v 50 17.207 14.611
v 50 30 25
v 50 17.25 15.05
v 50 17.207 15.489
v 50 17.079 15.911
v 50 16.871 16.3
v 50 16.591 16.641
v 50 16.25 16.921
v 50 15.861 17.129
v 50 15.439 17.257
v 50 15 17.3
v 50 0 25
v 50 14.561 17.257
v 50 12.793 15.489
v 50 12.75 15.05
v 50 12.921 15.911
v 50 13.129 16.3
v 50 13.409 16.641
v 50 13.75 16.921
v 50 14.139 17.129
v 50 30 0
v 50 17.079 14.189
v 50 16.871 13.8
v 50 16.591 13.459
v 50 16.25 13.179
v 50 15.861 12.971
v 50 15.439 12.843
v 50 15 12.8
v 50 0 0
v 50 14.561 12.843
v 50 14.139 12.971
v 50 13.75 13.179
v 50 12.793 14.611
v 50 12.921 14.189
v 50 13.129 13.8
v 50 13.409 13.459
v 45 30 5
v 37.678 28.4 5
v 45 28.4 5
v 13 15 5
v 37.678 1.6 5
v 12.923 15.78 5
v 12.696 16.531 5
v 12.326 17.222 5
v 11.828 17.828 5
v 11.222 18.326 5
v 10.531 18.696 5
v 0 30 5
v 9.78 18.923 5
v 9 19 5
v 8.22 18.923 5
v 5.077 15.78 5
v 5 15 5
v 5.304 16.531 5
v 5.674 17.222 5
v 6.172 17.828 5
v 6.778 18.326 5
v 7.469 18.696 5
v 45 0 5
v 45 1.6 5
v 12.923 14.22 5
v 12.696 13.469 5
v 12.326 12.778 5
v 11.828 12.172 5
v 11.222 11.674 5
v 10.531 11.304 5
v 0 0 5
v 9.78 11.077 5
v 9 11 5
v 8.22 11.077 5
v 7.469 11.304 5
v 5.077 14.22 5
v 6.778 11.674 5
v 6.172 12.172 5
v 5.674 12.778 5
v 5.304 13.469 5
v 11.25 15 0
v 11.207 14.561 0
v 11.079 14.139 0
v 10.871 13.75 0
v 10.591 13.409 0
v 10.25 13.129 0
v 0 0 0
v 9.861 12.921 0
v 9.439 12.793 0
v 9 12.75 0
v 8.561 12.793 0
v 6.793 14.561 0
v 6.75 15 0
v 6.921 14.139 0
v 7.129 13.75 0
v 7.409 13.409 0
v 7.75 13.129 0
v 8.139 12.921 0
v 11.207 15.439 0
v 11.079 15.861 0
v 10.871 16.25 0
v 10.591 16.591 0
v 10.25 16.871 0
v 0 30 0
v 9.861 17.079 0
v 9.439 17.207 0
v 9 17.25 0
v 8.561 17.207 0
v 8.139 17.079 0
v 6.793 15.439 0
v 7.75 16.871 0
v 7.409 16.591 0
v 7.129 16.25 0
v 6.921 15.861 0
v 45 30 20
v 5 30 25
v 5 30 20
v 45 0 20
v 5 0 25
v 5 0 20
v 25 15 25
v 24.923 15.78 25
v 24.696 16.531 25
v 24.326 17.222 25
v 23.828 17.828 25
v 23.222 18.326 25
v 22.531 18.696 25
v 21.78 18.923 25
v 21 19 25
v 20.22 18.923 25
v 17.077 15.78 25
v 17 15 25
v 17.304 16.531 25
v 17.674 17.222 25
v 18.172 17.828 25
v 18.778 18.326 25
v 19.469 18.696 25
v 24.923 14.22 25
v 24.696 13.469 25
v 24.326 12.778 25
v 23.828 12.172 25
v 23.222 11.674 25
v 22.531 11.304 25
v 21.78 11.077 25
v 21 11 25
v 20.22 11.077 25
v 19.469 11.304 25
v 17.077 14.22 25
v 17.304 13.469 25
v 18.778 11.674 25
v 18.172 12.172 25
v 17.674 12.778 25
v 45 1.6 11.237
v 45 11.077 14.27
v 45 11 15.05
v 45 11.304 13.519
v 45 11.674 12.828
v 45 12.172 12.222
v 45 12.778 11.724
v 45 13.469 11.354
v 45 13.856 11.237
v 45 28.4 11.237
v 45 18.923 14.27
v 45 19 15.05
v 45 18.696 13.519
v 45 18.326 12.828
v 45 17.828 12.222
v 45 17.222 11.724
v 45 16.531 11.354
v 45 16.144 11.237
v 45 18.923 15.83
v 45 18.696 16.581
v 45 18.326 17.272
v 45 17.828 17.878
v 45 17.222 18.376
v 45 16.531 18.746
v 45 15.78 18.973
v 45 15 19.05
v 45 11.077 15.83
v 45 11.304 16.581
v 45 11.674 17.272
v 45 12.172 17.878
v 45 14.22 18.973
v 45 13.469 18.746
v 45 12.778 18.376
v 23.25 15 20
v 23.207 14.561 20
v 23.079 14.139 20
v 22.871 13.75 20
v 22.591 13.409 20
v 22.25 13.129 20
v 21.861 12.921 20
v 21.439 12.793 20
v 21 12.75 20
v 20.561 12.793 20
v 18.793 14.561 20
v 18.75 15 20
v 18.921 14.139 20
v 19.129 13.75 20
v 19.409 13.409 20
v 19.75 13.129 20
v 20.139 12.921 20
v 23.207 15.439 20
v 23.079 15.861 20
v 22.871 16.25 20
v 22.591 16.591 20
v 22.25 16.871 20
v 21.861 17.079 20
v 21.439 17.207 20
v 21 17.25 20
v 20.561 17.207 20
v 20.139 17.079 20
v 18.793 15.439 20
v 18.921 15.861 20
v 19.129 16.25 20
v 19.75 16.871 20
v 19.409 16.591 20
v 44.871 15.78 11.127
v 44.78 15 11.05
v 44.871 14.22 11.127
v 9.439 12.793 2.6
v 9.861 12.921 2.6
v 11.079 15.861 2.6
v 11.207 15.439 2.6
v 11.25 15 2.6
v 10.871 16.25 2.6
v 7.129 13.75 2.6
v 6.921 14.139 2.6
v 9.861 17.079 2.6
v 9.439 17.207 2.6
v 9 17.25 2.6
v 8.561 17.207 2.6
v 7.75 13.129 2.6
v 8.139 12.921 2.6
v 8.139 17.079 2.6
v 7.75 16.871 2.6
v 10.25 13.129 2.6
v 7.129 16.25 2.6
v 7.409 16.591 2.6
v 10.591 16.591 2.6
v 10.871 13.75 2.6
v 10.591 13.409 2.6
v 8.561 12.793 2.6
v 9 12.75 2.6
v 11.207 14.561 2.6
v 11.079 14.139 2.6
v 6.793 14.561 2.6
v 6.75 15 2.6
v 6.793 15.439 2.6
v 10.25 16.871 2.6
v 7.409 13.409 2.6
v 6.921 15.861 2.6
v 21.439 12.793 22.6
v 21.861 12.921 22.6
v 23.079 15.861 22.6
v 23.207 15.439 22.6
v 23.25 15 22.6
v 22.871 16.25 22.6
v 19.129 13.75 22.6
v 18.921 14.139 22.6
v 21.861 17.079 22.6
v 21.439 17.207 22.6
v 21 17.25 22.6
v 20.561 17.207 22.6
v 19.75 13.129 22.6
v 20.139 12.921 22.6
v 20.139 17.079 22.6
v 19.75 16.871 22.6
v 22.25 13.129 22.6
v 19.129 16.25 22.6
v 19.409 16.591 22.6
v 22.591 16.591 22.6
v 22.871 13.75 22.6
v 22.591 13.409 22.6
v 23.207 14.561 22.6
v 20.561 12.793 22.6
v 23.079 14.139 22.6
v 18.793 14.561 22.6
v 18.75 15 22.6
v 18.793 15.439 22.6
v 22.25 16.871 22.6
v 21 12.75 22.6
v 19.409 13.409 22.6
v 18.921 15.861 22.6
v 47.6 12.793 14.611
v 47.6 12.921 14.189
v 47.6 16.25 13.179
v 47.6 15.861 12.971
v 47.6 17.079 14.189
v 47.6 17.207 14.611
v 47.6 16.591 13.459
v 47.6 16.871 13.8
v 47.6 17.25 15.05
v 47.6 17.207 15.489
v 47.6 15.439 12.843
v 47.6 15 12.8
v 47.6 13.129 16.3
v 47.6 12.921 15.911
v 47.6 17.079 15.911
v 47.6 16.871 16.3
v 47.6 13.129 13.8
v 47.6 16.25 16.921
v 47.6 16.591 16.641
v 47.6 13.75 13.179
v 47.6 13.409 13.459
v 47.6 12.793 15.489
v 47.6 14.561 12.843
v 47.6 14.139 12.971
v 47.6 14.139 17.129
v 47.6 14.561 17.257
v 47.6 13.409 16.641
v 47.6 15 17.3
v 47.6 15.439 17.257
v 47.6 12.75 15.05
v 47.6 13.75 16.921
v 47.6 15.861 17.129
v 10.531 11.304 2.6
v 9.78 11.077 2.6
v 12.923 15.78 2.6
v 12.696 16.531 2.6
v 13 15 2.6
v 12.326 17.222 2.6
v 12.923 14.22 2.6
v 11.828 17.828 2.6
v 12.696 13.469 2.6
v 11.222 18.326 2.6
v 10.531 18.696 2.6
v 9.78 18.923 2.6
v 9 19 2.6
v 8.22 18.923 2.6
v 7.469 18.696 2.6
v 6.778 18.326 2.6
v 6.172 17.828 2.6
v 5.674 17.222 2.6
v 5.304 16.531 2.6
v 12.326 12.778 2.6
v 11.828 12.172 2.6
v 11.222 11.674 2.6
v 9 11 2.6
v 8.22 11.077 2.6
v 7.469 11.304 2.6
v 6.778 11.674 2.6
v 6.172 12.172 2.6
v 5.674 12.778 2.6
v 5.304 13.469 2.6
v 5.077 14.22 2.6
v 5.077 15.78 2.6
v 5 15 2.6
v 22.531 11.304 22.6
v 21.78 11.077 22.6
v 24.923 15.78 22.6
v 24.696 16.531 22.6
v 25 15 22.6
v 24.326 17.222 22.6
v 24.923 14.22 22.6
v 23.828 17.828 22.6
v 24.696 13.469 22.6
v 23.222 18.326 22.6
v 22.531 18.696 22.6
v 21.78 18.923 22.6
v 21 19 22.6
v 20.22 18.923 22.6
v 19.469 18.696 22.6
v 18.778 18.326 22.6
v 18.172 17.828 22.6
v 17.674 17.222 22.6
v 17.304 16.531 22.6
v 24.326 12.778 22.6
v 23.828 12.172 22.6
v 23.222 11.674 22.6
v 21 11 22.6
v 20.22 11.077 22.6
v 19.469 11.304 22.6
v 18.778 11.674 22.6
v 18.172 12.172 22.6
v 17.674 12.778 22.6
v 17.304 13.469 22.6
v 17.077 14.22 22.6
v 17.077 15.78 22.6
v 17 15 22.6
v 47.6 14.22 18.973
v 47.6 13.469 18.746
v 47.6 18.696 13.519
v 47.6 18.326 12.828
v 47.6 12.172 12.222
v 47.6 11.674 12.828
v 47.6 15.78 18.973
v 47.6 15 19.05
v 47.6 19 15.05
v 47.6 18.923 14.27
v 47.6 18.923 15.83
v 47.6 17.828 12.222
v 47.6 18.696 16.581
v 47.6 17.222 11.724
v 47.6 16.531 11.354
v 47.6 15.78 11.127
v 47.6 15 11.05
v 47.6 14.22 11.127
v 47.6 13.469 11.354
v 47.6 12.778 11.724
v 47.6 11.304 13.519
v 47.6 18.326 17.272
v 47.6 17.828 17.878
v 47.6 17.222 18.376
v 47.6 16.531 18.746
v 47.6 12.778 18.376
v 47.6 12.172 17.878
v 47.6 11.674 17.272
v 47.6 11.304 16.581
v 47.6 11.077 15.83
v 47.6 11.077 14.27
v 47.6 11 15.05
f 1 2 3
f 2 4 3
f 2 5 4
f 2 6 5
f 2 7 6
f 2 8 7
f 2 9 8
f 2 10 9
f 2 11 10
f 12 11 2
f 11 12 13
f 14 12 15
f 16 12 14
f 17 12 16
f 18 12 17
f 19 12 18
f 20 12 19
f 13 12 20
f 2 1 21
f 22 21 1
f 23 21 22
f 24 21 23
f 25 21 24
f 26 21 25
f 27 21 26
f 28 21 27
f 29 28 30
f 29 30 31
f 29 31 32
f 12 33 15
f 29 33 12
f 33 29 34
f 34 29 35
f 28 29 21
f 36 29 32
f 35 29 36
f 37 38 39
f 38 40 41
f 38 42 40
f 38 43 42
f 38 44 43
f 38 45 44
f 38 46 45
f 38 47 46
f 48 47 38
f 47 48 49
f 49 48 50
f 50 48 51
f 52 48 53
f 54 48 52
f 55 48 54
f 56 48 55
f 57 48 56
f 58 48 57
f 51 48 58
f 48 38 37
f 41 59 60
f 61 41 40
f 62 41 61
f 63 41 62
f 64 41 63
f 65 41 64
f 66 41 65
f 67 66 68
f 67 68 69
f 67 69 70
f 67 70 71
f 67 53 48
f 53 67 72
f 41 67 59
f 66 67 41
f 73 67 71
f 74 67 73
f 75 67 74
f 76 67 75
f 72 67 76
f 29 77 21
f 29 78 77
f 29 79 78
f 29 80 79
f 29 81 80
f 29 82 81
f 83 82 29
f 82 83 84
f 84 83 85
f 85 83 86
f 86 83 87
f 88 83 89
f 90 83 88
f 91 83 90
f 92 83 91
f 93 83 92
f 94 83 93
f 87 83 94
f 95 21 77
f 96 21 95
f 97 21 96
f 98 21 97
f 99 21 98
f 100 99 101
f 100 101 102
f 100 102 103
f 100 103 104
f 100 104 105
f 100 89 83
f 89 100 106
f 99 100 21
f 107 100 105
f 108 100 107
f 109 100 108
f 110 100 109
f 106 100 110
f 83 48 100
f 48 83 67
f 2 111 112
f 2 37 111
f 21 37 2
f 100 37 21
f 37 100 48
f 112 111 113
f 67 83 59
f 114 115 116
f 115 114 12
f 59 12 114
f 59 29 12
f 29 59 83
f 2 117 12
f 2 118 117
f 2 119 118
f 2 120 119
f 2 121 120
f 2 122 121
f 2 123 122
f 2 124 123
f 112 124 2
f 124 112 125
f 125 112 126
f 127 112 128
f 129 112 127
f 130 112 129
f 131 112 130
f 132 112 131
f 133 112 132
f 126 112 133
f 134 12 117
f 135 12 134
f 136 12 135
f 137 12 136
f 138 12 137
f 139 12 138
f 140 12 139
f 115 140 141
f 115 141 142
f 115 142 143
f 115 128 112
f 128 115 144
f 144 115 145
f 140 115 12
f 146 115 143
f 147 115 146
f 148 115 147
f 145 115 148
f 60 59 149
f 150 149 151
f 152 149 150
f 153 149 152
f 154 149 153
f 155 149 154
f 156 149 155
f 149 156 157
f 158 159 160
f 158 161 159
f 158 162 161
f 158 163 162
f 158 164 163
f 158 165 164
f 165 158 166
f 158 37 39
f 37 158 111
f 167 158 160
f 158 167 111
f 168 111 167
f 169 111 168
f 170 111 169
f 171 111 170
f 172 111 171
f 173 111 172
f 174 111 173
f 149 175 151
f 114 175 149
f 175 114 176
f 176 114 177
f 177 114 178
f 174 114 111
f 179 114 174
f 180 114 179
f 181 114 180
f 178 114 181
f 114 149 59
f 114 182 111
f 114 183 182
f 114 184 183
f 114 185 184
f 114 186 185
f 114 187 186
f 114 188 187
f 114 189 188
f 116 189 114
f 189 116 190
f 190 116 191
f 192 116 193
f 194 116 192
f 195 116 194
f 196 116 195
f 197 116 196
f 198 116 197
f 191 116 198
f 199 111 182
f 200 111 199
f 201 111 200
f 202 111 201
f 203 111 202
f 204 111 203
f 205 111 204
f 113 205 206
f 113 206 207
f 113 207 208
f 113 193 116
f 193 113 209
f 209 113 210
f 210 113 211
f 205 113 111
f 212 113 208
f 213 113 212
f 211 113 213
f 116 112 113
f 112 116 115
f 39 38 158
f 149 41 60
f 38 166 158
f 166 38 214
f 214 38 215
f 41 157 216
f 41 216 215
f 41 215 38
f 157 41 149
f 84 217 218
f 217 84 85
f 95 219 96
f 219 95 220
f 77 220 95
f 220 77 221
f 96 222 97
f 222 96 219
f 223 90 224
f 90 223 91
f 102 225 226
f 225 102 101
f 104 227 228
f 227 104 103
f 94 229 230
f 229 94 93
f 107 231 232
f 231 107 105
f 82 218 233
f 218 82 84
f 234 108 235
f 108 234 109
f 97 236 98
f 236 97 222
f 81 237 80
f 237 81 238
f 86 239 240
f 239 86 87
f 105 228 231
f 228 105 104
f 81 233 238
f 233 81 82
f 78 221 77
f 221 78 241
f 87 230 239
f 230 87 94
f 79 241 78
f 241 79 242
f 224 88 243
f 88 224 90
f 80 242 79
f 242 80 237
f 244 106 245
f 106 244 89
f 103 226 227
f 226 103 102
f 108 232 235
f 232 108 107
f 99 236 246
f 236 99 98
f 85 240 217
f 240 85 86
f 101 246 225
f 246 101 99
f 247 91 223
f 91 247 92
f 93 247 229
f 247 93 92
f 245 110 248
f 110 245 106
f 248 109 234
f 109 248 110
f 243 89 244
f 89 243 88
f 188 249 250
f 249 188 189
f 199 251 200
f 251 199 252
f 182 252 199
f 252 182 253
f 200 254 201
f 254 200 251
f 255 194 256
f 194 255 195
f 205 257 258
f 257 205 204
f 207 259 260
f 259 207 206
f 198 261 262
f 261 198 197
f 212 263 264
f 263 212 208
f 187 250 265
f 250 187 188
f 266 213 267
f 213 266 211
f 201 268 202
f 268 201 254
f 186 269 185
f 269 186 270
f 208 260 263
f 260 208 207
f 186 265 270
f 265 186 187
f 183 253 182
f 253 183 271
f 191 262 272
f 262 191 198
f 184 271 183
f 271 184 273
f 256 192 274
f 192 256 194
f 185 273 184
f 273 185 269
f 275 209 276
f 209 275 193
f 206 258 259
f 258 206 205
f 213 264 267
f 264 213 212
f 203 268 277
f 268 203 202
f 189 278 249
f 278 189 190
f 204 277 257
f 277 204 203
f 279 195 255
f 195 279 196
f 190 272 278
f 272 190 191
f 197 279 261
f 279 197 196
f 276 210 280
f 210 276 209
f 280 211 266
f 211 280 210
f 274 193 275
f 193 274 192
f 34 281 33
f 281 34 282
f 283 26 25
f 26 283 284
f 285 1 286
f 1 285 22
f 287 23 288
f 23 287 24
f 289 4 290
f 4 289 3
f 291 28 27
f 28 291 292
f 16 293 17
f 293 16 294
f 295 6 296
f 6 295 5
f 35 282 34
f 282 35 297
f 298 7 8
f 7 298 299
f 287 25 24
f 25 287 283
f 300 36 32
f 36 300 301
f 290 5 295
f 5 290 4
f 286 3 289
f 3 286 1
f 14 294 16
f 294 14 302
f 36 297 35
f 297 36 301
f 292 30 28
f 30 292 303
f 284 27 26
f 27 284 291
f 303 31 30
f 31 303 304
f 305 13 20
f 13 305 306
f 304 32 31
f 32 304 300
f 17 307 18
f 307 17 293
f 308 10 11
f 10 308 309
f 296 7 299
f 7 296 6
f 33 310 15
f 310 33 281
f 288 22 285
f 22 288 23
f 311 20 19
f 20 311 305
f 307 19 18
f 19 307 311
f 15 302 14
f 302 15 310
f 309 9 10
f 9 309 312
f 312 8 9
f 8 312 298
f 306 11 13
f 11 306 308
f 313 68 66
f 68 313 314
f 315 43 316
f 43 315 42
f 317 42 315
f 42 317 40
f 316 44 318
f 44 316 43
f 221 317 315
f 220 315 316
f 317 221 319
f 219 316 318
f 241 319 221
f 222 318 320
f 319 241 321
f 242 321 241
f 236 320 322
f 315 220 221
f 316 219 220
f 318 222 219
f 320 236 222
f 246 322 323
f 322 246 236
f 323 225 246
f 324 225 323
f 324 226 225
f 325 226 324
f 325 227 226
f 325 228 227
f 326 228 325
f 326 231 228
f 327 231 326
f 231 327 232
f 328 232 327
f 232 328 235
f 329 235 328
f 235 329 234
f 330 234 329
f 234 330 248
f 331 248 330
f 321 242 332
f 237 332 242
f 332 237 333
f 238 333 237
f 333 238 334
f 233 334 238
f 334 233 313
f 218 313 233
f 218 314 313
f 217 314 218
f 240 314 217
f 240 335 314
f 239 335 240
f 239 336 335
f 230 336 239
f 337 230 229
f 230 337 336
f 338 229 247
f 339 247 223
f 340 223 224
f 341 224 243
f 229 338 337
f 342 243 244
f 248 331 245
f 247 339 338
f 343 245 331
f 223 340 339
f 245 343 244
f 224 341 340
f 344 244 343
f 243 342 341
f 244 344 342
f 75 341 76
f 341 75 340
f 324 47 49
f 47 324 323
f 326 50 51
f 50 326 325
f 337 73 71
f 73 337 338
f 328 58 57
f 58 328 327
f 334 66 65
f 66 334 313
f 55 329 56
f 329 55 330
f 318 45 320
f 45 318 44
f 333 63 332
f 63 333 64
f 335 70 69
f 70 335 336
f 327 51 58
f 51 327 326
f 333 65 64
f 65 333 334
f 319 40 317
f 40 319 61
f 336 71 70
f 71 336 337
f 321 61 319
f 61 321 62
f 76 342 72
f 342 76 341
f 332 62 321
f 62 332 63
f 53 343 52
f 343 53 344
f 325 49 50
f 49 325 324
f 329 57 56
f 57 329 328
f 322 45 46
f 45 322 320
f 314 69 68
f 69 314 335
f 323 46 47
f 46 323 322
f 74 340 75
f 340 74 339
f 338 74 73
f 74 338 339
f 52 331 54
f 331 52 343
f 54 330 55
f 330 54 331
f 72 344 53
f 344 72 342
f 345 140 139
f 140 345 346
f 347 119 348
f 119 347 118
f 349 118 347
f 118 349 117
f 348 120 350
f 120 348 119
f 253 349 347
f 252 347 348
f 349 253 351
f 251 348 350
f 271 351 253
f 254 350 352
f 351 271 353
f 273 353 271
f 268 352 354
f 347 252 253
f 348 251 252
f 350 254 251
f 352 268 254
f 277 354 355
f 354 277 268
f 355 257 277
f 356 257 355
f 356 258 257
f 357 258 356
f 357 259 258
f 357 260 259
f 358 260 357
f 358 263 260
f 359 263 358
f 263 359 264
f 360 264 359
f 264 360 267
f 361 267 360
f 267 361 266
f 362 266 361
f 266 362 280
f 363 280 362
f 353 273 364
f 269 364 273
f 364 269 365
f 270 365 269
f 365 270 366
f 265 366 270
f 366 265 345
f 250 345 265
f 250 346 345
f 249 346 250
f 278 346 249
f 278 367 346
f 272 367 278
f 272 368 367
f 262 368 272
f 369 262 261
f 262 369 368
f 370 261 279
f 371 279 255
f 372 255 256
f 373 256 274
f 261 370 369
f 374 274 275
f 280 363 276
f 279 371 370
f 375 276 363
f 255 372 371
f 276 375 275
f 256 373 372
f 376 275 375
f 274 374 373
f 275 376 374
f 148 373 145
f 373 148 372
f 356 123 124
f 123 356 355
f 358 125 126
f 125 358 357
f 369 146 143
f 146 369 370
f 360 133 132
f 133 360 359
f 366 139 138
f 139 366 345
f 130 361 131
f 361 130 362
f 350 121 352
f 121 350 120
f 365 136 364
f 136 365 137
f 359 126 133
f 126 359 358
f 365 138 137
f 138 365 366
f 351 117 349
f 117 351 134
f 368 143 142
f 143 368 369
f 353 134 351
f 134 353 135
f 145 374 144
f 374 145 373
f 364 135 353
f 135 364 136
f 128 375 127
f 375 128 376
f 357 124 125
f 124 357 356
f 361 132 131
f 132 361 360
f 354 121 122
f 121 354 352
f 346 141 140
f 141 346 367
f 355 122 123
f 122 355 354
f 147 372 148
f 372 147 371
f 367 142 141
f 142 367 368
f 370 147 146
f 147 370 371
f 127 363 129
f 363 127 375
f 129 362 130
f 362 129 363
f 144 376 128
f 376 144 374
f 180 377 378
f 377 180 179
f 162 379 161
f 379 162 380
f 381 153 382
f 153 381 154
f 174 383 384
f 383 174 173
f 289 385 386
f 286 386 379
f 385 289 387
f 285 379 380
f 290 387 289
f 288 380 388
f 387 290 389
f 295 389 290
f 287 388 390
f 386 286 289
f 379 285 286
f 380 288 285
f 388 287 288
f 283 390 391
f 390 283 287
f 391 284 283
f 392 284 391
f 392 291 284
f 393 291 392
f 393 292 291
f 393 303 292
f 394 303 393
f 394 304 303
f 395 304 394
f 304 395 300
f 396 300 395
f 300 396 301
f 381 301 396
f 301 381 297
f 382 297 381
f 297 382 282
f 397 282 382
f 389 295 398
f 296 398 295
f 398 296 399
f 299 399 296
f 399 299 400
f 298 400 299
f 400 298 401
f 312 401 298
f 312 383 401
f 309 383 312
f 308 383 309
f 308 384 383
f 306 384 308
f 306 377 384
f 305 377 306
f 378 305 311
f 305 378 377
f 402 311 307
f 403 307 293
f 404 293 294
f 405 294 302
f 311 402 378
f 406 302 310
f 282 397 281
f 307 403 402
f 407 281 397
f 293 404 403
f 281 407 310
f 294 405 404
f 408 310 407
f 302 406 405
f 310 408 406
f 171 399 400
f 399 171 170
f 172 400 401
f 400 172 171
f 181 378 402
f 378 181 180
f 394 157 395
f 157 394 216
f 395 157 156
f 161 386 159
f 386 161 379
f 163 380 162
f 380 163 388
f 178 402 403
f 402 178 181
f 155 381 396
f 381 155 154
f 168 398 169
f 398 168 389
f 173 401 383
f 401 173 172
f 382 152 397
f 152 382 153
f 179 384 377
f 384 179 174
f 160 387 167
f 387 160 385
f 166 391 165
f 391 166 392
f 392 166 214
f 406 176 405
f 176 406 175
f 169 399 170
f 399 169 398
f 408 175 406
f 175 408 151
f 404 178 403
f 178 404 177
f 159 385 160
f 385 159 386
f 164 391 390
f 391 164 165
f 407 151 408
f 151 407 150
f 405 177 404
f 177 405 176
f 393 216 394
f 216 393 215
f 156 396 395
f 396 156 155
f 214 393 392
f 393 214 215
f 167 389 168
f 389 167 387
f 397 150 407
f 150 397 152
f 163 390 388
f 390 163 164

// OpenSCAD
$fn = 32;

// ----------------------------------------------------------------------
// Z-bracket: 50 x 30 x 25 mm
// ----------------------------------------------------------------------

// --- parameters (mm) ---
foot_len = 50;            // lower foot length, X
top_len = 40;             // upper foot length, X
depth = 30;               // bracket width, Y
step_h = 25;              // overall rise, Z
plate_t = 5;              // plate thickness
hole_d = 4.5;             // clearance for M4
cb_d = 8;                 // counterbore diameter
cb_h = 2.4;               // counterbore depth
rib_len = 9.2;            // gusset leg
rib_sink = 1.6;           // gusset overlap into the plates

module hole_z(px, py, z0) {
  translate([px, py, z0 - 2.5]) cylinder(h = plate_t + 5, d = hole_d);
}
module hole_x(py, pz) {
  translate([-2.5, py, pz]) rotate([0, 90, 0]) cylinder(h = plate_t + 5, d = hole_d);
}
module cb_z(px, py, top_z) {
  translate([px, py, top_z - cb_h]) cylinder(h = cb_h + 0.5, d = cb_d);
}
module cb_x(py, pz) {
  translate([plate_t - cb_h, py, pz]) rotate([0, -90, 0]) cylinder(h = cb_h + 0.5, d = cb_d);
}
module gusset(x0) {
  translate([x0, depth - rib_sink, 0])
    rotate([90, 0, 0])
      linear_extrude(height = depth - 2 * rib_sink)
        polygon(points = [[rib_sink, plate_t - rib_sink],
                          [rib_sink, plate_t - rib_sink + rib_len],
                          [-rib_len, plate_t - rib_sink]]);
}

difference() {
  union() {
    cube([foot_len, depth, plate_t]);
    /* web, overlapping the lower foot */
    translate([foot_len - plate_t, 0, 0]) cube([plate_t, depth, step_h]);
    /* upper foot, sunk into the web */
    translate([foot_len - plate_t - top_len, 0, step_h - plate_t]) cube([top_len + plate_t, depth, plate_t]);
    gusset(foot_len - plate_t);
  }
  hole_z(9, 15, 0);
  translate([foot_len - plate_t - 24, 0, 0]) hole_z(0, 15, step_h - plate_t);
  translate([foot_len - plate_t, 0, 0]) hole_x(15, 15.05);
  cb_z(9, 15, plate_t);
  translate([foot_len - plate_t - 24, 0, 0]) cb_z(0, 15, step_h);
  translate([foot_len - plate_t, 0, 0]) cb_x(15, 15.05);
}
